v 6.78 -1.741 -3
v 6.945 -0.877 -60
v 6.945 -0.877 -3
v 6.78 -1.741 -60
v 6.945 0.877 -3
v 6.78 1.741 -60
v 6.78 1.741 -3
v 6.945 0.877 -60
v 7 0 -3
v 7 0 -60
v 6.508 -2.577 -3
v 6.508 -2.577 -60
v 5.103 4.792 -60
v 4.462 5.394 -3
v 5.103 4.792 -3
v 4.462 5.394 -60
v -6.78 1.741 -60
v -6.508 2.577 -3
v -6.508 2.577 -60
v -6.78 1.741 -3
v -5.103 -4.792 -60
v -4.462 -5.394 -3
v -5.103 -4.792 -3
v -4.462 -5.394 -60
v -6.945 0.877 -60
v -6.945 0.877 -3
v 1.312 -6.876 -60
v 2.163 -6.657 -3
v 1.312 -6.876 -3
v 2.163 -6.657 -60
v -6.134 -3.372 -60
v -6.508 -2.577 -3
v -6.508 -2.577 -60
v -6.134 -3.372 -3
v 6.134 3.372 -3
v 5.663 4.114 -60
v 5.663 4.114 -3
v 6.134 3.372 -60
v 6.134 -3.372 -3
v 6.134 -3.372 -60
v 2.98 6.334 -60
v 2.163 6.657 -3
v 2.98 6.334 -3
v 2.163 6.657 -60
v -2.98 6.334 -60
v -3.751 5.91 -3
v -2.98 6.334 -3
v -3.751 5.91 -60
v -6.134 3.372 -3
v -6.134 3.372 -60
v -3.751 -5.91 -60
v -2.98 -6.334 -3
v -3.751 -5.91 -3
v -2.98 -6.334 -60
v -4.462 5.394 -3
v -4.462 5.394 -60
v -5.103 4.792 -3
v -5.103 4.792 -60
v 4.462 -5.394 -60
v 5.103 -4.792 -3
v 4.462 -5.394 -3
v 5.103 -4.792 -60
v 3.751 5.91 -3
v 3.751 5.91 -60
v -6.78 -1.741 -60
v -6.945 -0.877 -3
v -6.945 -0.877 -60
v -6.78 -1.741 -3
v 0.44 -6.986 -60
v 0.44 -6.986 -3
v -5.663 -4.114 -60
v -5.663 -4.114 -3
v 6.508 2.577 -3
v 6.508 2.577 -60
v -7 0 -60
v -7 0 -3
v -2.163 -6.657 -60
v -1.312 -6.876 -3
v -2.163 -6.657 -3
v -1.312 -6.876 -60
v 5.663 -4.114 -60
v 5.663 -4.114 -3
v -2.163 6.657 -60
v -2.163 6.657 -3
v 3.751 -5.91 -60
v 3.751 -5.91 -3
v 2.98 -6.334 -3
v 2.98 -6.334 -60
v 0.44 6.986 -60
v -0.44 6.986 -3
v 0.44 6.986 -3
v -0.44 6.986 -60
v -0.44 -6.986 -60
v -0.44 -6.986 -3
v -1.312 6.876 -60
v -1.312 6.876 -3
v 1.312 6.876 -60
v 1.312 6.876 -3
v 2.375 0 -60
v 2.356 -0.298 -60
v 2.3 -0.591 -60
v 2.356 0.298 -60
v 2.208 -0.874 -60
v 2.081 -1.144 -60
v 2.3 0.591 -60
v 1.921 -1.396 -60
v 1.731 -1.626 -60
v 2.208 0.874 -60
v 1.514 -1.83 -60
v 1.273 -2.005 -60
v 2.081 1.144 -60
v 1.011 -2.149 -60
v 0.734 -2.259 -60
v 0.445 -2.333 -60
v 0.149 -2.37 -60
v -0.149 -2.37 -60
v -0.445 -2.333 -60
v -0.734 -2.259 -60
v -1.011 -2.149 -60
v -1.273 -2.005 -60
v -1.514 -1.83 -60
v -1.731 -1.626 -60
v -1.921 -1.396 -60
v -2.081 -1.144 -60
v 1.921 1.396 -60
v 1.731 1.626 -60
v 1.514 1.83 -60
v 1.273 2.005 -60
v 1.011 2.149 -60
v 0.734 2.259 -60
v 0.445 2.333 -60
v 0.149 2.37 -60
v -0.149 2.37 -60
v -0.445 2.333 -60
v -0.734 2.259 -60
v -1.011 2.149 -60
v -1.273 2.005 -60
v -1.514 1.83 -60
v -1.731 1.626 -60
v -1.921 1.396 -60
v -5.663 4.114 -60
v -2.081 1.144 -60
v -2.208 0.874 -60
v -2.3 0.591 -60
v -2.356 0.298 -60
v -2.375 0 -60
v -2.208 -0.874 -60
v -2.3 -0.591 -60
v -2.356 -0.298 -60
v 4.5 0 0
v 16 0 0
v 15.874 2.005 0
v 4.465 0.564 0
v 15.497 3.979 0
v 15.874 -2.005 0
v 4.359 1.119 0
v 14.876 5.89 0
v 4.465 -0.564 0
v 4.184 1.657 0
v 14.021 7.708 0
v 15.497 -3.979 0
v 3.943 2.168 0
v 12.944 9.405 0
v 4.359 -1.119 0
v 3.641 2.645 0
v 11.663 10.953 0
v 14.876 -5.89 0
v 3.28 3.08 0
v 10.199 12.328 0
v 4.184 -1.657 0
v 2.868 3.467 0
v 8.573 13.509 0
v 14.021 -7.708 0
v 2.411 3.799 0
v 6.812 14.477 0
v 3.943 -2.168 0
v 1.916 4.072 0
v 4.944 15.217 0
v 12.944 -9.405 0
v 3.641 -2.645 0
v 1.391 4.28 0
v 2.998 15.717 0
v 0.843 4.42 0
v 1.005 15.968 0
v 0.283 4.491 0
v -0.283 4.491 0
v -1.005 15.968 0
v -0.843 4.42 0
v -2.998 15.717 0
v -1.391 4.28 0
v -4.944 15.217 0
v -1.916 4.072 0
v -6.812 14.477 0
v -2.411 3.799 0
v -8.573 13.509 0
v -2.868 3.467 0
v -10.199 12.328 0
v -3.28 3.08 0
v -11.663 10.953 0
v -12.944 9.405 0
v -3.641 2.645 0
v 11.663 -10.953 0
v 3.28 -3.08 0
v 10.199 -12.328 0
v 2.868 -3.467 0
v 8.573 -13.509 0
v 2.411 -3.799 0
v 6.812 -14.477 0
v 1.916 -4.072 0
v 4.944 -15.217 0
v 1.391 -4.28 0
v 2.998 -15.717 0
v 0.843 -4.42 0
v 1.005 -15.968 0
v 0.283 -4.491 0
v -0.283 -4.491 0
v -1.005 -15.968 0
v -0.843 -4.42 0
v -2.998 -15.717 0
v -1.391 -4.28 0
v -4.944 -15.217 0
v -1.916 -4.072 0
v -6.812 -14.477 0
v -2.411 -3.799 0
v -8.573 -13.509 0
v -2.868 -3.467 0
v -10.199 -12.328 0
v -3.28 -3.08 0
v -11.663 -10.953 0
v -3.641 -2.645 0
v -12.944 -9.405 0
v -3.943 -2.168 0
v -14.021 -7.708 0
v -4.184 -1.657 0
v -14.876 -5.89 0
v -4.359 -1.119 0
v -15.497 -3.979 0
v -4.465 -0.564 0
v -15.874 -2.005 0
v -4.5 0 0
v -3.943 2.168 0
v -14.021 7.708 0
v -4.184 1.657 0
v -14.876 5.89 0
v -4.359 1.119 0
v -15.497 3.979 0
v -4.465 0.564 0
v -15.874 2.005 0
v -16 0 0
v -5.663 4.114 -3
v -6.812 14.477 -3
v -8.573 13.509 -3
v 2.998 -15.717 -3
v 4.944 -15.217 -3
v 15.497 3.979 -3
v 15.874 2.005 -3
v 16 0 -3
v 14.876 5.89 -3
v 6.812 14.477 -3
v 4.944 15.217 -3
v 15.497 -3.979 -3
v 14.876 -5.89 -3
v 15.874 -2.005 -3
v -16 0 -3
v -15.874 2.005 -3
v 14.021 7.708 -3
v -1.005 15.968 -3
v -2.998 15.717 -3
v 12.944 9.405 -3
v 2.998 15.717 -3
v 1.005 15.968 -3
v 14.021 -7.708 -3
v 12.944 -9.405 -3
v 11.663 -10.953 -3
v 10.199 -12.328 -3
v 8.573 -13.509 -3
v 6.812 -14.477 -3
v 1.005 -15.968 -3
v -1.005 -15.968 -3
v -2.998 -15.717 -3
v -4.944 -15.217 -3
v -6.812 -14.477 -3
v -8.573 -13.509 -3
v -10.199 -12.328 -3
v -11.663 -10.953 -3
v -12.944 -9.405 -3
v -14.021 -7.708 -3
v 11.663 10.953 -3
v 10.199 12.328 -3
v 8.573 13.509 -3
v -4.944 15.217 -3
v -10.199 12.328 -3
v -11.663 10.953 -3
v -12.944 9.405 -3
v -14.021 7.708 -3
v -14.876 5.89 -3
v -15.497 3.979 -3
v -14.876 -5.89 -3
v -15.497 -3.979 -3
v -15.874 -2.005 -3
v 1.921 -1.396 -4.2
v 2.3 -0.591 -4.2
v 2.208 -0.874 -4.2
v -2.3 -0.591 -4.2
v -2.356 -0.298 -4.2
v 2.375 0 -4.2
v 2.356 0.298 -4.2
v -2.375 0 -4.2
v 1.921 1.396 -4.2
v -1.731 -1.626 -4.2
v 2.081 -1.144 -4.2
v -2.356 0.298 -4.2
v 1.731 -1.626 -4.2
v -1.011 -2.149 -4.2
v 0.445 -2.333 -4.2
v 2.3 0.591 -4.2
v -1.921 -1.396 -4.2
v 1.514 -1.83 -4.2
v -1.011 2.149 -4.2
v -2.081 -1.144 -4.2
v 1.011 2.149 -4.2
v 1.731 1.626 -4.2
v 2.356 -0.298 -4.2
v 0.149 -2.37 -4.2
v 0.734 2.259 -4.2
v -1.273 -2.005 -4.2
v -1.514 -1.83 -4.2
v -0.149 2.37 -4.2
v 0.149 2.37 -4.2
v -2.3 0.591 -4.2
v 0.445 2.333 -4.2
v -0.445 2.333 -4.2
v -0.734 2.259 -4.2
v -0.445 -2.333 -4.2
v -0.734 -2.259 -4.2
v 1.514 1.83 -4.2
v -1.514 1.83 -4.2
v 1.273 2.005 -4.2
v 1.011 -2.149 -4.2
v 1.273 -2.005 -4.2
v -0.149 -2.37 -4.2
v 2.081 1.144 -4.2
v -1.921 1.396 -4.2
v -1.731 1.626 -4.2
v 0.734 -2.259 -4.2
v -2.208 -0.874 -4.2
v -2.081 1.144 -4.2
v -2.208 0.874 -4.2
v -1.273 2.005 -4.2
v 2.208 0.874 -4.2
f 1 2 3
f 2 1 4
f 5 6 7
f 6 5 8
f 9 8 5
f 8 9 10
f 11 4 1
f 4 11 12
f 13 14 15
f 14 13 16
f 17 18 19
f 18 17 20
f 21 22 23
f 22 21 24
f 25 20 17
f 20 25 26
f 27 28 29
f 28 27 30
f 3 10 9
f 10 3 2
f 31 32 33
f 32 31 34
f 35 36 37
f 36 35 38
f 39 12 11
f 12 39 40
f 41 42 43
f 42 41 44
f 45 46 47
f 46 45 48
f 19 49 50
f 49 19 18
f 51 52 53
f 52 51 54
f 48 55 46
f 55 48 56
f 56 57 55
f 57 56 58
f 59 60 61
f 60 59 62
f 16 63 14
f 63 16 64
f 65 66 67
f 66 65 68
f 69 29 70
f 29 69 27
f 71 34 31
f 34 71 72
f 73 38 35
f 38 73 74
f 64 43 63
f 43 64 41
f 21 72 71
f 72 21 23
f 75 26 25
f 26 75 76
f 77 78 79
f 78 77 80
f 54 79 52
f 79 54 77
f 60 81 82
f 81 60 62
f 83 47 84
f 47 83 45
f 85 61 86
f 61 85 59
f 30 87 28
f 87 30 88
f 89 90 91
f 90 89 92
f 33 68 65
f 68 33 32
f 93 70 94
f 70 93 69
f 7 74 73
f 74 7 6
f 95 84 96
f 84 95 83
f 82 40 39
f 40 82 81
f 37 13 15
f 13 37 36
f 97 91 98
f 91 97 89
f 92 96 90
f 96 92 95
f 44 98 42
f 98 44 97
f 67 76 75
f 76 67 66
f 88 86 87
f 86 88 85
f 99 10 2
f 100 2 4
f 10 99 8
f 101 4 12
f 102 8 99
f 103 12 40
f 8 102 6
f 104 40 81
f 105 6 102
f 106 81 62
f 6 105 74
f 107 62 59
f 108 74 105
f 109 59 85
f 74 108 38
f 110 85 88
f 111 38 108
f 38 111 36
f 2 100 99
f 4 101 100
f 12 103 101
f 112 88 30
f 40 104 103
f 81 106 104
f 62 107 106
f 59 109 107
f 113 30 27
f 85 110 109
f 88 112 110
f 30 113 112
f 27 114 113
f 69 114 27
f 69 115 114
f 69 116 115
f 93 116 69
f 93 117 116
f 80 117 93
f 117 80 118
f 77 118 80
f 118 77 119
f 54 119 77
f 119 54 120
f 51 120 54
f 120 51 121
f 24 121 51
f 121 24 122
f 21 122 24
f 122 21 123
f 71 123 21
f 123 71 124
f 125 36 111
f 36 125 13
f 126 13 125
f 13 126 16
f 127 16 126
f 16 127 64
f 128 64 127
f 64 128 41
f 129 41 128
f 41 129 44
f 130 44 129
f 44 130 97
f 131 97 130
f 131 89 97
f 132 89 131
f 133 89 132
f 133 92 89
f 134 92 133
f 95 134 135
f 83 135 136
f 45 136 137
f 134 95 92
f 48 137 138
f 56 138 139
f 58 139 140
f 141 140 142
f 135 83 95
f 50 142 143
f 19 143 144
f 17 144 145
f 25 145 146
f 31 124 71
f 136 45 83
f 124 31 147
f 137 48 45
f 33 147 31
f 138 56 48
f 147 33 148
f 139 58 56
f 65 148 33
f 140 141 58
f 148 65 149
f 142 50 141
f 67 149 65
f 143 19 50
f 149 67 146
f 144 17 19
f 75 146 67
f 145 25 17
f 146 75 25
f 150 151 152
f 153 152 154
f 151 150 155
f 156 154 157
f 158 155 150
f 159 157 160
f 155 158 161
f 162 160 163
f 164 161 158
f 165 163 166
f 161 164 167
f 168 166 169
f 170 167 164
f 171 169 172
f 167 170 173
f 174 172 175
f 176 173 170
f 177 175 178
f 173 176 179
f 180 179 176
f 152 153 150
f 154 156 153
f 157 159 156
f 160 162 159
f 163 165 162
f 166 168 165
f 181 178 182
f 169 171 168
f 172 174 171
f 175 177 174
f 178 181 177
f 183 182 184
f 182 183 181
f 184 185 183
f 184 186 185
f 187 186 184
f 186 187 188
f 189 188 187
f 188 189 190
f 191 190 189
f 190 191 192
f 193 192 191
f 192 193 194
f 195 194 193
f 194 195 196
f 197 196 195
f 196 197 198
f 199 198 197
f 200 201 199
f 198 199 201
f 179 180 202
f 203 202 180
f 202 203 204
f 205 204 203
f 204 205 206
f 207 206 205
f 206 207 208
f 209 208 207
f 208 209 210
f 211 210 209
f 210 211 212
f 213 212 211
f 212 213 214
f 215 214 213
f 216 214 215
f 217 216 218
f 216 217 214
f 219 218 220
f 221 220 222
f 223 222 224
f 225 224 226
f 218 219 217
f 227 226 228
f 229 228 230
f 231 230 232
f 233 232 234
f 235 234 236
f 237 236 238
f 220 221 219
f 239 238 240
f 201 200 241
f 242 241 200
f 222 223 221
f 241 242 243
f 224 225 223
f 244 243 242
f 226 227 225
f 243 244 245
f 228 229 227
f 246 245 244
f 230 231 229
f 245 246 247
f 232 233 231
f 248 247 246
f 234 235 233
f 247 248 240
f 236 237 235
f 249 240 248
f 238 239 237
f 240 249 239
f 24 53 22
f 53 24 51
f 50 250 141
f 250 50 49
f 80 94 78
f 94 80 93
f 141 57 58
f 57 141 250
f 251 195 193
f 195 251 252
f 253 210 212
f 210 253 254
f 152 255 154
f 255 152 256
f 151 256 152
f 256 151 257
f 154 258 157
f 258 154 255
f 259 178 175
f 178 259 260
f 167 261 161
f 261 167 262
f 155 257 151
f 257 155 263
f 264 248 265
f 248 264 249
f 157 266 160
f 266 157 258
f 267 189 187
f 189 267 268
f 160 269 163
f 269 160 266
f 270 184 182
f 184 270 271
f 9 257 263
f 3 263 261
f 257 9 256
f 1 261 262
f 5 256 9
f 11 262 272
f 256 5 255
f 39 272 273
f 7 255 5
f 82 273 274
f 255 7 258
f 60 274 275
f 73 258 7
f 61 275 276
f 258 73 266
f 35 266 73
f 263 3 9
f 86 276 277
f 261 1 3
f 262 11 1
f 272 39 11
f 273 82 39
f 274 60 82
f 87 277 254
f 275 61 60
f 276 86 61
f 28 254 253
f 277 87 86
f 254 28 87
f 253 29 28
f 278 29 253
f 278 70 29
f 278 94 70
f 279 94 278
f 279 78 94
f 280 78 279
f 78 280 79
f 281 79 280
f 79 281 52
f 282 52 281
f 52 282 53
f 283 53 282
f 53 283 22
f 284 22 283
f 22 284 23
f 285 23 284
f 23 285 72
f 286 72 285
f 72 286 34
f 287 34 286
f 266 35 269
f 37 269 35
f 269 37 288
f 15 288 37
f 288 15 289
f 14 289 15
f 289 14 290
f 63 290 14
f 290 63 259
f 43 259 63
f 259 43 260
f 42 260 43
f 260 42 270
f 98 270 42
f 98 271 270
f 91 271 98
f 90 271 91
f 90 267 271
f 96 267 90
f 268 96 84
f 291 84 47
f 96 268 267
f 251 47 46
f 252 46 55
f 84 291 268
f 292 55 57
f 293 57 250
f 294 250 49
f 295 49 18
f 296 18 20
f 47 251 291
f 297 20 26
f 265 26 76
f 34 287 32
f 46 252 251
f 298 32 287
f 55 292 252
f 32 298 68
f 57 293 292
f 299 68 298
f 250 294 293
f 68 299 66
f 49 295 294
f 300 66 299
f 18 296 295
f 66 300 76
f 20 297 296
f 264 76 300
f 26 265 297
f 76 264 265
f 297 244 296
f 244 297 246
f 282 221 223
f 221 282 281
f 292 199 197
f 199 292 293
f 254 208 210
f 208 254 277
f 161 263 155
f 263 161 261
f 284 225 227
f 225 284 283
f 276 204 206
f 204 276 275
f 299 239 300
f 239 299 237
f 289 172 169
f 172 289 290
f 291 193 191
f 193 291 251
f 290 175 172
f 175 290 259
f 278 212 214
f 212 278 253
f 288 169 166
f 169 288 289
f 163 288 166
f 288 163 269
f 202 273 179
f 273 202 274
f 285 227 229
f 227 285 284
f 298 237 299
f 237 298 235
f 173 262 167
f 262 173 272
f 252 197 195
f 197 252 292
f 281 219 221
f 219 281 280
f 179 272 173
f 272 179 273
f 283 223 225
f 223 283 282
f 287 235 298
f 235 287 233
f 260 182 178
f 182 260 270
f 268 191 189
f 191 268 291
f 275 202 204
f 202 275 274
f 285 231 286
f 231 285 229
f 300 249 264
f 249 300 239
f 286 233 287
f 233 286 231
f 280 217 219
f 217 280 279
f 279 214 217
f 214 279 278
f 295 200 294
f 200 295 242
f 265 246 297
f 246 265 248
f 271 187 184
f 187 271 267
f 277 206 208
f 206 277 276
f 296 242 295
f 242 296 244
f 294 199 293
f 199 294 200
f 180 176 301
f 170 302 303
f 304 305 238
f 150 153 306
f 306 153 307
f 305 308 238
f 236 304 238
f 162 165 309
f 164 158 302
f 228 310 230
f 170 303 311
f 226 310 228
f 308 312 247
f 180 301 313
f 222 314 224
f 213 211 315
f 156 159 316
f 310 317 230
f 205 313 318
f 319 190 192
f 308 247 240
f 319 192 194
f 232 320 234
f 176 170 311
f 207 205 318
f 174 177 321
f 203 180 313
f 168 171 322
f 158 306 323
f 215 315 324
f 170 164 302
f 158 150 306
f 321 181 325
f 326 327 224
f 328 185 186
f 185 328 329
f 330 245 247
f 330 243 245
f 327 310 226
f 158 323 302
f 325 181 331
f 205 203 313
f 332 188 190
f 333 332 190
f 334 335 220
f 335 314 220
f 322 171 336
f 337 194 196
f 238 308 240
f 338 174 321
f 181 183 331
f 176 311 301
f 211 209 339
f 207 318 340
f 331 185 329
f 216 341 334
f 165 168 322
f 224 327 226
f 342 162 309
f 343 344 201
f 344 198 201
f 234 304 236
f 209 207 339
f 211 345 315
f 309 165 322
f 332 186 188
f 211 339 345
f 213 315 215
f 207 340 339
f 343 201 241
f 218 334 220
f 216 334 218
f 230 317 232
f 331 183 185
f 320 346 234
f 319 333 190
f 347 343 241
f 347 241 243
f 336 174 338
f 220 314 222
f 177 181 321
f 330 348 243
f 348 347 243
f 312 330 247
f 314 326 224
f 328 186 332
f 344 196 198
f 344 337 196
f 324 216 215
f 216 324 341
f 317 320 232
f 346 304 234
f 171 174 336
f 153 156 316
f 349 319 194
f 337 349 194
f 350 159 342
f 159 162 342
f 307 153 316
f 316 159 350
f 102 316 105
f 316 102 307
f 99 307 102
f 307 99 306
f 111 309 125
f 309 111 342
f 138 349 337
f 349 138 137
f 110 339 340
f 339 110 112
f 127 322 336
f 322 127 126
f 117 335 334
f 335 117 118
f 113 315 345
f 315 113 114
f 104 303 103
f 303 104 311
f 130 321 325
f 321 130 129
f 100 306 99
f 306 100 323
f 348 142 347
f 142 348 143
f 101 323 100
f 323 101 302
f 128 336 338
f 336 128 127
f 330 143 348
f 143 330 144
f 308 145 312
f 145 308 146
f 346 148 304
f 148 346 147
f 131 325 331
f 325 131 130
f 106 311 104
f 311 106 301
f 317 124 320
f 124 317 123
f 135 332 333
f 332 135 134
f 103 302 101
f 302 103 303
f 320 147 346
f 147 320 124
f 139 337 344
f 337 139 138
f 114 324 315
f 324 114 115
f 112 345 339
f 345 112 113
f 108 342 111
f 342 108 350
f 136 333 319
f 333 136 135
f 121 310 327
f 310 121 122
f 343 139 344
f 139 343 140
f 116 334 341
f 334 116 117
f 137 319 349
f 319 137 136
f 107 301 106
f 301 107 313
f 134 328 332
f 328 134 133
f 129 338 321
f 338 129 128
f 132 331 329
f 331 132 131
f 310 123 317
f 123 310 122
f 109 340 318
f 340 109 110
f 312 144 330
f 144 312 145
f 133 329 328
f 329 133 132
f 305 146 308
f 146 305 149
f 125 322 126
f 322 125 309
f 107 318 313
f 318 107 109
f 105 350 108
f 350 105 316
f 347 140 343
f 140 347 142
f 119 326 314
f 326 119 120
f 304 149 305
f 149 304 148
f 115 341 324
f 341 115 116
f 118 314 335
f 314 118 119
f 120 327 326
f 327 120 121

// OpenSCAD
$fn = 50;


difference() {
	union() {
		translate(v = [0, 0, -60.0000000000]) {
			cylinder(h = 60, r = 7.0000000000);
		}
		translate(v = [0, 0, -3.0000000000]) {
			cylinder(h = 3, r = 16.0000000000);
		}
	}
	union() {
		translate(v = [0, 0, 0]) {
			rotate(a = [0, 0, 0]) {
				difference() {
					union() {
						#translate(v = [0, 0, -60.0000000000]) {
							cylinder(h = 60, r = 2.2500000000);
						}
						#translate(v = [0, 0, -4.2000000000]) {
							cylinder(h = 4.2000000000, r1 = 2.3750000000, r2 = 4.5000000000);
						}
						#translate(v = [0, 0, -60.0000000000]) {
							cylinder(h = 60, r = 2.3750000000);
						}
						#translate(v = [0, 0, -60.0000000000]) {
							cylinder(h = 60, r = 2.2500000000);
						}
					}
					union();
				}
			}
		}
	}
}
